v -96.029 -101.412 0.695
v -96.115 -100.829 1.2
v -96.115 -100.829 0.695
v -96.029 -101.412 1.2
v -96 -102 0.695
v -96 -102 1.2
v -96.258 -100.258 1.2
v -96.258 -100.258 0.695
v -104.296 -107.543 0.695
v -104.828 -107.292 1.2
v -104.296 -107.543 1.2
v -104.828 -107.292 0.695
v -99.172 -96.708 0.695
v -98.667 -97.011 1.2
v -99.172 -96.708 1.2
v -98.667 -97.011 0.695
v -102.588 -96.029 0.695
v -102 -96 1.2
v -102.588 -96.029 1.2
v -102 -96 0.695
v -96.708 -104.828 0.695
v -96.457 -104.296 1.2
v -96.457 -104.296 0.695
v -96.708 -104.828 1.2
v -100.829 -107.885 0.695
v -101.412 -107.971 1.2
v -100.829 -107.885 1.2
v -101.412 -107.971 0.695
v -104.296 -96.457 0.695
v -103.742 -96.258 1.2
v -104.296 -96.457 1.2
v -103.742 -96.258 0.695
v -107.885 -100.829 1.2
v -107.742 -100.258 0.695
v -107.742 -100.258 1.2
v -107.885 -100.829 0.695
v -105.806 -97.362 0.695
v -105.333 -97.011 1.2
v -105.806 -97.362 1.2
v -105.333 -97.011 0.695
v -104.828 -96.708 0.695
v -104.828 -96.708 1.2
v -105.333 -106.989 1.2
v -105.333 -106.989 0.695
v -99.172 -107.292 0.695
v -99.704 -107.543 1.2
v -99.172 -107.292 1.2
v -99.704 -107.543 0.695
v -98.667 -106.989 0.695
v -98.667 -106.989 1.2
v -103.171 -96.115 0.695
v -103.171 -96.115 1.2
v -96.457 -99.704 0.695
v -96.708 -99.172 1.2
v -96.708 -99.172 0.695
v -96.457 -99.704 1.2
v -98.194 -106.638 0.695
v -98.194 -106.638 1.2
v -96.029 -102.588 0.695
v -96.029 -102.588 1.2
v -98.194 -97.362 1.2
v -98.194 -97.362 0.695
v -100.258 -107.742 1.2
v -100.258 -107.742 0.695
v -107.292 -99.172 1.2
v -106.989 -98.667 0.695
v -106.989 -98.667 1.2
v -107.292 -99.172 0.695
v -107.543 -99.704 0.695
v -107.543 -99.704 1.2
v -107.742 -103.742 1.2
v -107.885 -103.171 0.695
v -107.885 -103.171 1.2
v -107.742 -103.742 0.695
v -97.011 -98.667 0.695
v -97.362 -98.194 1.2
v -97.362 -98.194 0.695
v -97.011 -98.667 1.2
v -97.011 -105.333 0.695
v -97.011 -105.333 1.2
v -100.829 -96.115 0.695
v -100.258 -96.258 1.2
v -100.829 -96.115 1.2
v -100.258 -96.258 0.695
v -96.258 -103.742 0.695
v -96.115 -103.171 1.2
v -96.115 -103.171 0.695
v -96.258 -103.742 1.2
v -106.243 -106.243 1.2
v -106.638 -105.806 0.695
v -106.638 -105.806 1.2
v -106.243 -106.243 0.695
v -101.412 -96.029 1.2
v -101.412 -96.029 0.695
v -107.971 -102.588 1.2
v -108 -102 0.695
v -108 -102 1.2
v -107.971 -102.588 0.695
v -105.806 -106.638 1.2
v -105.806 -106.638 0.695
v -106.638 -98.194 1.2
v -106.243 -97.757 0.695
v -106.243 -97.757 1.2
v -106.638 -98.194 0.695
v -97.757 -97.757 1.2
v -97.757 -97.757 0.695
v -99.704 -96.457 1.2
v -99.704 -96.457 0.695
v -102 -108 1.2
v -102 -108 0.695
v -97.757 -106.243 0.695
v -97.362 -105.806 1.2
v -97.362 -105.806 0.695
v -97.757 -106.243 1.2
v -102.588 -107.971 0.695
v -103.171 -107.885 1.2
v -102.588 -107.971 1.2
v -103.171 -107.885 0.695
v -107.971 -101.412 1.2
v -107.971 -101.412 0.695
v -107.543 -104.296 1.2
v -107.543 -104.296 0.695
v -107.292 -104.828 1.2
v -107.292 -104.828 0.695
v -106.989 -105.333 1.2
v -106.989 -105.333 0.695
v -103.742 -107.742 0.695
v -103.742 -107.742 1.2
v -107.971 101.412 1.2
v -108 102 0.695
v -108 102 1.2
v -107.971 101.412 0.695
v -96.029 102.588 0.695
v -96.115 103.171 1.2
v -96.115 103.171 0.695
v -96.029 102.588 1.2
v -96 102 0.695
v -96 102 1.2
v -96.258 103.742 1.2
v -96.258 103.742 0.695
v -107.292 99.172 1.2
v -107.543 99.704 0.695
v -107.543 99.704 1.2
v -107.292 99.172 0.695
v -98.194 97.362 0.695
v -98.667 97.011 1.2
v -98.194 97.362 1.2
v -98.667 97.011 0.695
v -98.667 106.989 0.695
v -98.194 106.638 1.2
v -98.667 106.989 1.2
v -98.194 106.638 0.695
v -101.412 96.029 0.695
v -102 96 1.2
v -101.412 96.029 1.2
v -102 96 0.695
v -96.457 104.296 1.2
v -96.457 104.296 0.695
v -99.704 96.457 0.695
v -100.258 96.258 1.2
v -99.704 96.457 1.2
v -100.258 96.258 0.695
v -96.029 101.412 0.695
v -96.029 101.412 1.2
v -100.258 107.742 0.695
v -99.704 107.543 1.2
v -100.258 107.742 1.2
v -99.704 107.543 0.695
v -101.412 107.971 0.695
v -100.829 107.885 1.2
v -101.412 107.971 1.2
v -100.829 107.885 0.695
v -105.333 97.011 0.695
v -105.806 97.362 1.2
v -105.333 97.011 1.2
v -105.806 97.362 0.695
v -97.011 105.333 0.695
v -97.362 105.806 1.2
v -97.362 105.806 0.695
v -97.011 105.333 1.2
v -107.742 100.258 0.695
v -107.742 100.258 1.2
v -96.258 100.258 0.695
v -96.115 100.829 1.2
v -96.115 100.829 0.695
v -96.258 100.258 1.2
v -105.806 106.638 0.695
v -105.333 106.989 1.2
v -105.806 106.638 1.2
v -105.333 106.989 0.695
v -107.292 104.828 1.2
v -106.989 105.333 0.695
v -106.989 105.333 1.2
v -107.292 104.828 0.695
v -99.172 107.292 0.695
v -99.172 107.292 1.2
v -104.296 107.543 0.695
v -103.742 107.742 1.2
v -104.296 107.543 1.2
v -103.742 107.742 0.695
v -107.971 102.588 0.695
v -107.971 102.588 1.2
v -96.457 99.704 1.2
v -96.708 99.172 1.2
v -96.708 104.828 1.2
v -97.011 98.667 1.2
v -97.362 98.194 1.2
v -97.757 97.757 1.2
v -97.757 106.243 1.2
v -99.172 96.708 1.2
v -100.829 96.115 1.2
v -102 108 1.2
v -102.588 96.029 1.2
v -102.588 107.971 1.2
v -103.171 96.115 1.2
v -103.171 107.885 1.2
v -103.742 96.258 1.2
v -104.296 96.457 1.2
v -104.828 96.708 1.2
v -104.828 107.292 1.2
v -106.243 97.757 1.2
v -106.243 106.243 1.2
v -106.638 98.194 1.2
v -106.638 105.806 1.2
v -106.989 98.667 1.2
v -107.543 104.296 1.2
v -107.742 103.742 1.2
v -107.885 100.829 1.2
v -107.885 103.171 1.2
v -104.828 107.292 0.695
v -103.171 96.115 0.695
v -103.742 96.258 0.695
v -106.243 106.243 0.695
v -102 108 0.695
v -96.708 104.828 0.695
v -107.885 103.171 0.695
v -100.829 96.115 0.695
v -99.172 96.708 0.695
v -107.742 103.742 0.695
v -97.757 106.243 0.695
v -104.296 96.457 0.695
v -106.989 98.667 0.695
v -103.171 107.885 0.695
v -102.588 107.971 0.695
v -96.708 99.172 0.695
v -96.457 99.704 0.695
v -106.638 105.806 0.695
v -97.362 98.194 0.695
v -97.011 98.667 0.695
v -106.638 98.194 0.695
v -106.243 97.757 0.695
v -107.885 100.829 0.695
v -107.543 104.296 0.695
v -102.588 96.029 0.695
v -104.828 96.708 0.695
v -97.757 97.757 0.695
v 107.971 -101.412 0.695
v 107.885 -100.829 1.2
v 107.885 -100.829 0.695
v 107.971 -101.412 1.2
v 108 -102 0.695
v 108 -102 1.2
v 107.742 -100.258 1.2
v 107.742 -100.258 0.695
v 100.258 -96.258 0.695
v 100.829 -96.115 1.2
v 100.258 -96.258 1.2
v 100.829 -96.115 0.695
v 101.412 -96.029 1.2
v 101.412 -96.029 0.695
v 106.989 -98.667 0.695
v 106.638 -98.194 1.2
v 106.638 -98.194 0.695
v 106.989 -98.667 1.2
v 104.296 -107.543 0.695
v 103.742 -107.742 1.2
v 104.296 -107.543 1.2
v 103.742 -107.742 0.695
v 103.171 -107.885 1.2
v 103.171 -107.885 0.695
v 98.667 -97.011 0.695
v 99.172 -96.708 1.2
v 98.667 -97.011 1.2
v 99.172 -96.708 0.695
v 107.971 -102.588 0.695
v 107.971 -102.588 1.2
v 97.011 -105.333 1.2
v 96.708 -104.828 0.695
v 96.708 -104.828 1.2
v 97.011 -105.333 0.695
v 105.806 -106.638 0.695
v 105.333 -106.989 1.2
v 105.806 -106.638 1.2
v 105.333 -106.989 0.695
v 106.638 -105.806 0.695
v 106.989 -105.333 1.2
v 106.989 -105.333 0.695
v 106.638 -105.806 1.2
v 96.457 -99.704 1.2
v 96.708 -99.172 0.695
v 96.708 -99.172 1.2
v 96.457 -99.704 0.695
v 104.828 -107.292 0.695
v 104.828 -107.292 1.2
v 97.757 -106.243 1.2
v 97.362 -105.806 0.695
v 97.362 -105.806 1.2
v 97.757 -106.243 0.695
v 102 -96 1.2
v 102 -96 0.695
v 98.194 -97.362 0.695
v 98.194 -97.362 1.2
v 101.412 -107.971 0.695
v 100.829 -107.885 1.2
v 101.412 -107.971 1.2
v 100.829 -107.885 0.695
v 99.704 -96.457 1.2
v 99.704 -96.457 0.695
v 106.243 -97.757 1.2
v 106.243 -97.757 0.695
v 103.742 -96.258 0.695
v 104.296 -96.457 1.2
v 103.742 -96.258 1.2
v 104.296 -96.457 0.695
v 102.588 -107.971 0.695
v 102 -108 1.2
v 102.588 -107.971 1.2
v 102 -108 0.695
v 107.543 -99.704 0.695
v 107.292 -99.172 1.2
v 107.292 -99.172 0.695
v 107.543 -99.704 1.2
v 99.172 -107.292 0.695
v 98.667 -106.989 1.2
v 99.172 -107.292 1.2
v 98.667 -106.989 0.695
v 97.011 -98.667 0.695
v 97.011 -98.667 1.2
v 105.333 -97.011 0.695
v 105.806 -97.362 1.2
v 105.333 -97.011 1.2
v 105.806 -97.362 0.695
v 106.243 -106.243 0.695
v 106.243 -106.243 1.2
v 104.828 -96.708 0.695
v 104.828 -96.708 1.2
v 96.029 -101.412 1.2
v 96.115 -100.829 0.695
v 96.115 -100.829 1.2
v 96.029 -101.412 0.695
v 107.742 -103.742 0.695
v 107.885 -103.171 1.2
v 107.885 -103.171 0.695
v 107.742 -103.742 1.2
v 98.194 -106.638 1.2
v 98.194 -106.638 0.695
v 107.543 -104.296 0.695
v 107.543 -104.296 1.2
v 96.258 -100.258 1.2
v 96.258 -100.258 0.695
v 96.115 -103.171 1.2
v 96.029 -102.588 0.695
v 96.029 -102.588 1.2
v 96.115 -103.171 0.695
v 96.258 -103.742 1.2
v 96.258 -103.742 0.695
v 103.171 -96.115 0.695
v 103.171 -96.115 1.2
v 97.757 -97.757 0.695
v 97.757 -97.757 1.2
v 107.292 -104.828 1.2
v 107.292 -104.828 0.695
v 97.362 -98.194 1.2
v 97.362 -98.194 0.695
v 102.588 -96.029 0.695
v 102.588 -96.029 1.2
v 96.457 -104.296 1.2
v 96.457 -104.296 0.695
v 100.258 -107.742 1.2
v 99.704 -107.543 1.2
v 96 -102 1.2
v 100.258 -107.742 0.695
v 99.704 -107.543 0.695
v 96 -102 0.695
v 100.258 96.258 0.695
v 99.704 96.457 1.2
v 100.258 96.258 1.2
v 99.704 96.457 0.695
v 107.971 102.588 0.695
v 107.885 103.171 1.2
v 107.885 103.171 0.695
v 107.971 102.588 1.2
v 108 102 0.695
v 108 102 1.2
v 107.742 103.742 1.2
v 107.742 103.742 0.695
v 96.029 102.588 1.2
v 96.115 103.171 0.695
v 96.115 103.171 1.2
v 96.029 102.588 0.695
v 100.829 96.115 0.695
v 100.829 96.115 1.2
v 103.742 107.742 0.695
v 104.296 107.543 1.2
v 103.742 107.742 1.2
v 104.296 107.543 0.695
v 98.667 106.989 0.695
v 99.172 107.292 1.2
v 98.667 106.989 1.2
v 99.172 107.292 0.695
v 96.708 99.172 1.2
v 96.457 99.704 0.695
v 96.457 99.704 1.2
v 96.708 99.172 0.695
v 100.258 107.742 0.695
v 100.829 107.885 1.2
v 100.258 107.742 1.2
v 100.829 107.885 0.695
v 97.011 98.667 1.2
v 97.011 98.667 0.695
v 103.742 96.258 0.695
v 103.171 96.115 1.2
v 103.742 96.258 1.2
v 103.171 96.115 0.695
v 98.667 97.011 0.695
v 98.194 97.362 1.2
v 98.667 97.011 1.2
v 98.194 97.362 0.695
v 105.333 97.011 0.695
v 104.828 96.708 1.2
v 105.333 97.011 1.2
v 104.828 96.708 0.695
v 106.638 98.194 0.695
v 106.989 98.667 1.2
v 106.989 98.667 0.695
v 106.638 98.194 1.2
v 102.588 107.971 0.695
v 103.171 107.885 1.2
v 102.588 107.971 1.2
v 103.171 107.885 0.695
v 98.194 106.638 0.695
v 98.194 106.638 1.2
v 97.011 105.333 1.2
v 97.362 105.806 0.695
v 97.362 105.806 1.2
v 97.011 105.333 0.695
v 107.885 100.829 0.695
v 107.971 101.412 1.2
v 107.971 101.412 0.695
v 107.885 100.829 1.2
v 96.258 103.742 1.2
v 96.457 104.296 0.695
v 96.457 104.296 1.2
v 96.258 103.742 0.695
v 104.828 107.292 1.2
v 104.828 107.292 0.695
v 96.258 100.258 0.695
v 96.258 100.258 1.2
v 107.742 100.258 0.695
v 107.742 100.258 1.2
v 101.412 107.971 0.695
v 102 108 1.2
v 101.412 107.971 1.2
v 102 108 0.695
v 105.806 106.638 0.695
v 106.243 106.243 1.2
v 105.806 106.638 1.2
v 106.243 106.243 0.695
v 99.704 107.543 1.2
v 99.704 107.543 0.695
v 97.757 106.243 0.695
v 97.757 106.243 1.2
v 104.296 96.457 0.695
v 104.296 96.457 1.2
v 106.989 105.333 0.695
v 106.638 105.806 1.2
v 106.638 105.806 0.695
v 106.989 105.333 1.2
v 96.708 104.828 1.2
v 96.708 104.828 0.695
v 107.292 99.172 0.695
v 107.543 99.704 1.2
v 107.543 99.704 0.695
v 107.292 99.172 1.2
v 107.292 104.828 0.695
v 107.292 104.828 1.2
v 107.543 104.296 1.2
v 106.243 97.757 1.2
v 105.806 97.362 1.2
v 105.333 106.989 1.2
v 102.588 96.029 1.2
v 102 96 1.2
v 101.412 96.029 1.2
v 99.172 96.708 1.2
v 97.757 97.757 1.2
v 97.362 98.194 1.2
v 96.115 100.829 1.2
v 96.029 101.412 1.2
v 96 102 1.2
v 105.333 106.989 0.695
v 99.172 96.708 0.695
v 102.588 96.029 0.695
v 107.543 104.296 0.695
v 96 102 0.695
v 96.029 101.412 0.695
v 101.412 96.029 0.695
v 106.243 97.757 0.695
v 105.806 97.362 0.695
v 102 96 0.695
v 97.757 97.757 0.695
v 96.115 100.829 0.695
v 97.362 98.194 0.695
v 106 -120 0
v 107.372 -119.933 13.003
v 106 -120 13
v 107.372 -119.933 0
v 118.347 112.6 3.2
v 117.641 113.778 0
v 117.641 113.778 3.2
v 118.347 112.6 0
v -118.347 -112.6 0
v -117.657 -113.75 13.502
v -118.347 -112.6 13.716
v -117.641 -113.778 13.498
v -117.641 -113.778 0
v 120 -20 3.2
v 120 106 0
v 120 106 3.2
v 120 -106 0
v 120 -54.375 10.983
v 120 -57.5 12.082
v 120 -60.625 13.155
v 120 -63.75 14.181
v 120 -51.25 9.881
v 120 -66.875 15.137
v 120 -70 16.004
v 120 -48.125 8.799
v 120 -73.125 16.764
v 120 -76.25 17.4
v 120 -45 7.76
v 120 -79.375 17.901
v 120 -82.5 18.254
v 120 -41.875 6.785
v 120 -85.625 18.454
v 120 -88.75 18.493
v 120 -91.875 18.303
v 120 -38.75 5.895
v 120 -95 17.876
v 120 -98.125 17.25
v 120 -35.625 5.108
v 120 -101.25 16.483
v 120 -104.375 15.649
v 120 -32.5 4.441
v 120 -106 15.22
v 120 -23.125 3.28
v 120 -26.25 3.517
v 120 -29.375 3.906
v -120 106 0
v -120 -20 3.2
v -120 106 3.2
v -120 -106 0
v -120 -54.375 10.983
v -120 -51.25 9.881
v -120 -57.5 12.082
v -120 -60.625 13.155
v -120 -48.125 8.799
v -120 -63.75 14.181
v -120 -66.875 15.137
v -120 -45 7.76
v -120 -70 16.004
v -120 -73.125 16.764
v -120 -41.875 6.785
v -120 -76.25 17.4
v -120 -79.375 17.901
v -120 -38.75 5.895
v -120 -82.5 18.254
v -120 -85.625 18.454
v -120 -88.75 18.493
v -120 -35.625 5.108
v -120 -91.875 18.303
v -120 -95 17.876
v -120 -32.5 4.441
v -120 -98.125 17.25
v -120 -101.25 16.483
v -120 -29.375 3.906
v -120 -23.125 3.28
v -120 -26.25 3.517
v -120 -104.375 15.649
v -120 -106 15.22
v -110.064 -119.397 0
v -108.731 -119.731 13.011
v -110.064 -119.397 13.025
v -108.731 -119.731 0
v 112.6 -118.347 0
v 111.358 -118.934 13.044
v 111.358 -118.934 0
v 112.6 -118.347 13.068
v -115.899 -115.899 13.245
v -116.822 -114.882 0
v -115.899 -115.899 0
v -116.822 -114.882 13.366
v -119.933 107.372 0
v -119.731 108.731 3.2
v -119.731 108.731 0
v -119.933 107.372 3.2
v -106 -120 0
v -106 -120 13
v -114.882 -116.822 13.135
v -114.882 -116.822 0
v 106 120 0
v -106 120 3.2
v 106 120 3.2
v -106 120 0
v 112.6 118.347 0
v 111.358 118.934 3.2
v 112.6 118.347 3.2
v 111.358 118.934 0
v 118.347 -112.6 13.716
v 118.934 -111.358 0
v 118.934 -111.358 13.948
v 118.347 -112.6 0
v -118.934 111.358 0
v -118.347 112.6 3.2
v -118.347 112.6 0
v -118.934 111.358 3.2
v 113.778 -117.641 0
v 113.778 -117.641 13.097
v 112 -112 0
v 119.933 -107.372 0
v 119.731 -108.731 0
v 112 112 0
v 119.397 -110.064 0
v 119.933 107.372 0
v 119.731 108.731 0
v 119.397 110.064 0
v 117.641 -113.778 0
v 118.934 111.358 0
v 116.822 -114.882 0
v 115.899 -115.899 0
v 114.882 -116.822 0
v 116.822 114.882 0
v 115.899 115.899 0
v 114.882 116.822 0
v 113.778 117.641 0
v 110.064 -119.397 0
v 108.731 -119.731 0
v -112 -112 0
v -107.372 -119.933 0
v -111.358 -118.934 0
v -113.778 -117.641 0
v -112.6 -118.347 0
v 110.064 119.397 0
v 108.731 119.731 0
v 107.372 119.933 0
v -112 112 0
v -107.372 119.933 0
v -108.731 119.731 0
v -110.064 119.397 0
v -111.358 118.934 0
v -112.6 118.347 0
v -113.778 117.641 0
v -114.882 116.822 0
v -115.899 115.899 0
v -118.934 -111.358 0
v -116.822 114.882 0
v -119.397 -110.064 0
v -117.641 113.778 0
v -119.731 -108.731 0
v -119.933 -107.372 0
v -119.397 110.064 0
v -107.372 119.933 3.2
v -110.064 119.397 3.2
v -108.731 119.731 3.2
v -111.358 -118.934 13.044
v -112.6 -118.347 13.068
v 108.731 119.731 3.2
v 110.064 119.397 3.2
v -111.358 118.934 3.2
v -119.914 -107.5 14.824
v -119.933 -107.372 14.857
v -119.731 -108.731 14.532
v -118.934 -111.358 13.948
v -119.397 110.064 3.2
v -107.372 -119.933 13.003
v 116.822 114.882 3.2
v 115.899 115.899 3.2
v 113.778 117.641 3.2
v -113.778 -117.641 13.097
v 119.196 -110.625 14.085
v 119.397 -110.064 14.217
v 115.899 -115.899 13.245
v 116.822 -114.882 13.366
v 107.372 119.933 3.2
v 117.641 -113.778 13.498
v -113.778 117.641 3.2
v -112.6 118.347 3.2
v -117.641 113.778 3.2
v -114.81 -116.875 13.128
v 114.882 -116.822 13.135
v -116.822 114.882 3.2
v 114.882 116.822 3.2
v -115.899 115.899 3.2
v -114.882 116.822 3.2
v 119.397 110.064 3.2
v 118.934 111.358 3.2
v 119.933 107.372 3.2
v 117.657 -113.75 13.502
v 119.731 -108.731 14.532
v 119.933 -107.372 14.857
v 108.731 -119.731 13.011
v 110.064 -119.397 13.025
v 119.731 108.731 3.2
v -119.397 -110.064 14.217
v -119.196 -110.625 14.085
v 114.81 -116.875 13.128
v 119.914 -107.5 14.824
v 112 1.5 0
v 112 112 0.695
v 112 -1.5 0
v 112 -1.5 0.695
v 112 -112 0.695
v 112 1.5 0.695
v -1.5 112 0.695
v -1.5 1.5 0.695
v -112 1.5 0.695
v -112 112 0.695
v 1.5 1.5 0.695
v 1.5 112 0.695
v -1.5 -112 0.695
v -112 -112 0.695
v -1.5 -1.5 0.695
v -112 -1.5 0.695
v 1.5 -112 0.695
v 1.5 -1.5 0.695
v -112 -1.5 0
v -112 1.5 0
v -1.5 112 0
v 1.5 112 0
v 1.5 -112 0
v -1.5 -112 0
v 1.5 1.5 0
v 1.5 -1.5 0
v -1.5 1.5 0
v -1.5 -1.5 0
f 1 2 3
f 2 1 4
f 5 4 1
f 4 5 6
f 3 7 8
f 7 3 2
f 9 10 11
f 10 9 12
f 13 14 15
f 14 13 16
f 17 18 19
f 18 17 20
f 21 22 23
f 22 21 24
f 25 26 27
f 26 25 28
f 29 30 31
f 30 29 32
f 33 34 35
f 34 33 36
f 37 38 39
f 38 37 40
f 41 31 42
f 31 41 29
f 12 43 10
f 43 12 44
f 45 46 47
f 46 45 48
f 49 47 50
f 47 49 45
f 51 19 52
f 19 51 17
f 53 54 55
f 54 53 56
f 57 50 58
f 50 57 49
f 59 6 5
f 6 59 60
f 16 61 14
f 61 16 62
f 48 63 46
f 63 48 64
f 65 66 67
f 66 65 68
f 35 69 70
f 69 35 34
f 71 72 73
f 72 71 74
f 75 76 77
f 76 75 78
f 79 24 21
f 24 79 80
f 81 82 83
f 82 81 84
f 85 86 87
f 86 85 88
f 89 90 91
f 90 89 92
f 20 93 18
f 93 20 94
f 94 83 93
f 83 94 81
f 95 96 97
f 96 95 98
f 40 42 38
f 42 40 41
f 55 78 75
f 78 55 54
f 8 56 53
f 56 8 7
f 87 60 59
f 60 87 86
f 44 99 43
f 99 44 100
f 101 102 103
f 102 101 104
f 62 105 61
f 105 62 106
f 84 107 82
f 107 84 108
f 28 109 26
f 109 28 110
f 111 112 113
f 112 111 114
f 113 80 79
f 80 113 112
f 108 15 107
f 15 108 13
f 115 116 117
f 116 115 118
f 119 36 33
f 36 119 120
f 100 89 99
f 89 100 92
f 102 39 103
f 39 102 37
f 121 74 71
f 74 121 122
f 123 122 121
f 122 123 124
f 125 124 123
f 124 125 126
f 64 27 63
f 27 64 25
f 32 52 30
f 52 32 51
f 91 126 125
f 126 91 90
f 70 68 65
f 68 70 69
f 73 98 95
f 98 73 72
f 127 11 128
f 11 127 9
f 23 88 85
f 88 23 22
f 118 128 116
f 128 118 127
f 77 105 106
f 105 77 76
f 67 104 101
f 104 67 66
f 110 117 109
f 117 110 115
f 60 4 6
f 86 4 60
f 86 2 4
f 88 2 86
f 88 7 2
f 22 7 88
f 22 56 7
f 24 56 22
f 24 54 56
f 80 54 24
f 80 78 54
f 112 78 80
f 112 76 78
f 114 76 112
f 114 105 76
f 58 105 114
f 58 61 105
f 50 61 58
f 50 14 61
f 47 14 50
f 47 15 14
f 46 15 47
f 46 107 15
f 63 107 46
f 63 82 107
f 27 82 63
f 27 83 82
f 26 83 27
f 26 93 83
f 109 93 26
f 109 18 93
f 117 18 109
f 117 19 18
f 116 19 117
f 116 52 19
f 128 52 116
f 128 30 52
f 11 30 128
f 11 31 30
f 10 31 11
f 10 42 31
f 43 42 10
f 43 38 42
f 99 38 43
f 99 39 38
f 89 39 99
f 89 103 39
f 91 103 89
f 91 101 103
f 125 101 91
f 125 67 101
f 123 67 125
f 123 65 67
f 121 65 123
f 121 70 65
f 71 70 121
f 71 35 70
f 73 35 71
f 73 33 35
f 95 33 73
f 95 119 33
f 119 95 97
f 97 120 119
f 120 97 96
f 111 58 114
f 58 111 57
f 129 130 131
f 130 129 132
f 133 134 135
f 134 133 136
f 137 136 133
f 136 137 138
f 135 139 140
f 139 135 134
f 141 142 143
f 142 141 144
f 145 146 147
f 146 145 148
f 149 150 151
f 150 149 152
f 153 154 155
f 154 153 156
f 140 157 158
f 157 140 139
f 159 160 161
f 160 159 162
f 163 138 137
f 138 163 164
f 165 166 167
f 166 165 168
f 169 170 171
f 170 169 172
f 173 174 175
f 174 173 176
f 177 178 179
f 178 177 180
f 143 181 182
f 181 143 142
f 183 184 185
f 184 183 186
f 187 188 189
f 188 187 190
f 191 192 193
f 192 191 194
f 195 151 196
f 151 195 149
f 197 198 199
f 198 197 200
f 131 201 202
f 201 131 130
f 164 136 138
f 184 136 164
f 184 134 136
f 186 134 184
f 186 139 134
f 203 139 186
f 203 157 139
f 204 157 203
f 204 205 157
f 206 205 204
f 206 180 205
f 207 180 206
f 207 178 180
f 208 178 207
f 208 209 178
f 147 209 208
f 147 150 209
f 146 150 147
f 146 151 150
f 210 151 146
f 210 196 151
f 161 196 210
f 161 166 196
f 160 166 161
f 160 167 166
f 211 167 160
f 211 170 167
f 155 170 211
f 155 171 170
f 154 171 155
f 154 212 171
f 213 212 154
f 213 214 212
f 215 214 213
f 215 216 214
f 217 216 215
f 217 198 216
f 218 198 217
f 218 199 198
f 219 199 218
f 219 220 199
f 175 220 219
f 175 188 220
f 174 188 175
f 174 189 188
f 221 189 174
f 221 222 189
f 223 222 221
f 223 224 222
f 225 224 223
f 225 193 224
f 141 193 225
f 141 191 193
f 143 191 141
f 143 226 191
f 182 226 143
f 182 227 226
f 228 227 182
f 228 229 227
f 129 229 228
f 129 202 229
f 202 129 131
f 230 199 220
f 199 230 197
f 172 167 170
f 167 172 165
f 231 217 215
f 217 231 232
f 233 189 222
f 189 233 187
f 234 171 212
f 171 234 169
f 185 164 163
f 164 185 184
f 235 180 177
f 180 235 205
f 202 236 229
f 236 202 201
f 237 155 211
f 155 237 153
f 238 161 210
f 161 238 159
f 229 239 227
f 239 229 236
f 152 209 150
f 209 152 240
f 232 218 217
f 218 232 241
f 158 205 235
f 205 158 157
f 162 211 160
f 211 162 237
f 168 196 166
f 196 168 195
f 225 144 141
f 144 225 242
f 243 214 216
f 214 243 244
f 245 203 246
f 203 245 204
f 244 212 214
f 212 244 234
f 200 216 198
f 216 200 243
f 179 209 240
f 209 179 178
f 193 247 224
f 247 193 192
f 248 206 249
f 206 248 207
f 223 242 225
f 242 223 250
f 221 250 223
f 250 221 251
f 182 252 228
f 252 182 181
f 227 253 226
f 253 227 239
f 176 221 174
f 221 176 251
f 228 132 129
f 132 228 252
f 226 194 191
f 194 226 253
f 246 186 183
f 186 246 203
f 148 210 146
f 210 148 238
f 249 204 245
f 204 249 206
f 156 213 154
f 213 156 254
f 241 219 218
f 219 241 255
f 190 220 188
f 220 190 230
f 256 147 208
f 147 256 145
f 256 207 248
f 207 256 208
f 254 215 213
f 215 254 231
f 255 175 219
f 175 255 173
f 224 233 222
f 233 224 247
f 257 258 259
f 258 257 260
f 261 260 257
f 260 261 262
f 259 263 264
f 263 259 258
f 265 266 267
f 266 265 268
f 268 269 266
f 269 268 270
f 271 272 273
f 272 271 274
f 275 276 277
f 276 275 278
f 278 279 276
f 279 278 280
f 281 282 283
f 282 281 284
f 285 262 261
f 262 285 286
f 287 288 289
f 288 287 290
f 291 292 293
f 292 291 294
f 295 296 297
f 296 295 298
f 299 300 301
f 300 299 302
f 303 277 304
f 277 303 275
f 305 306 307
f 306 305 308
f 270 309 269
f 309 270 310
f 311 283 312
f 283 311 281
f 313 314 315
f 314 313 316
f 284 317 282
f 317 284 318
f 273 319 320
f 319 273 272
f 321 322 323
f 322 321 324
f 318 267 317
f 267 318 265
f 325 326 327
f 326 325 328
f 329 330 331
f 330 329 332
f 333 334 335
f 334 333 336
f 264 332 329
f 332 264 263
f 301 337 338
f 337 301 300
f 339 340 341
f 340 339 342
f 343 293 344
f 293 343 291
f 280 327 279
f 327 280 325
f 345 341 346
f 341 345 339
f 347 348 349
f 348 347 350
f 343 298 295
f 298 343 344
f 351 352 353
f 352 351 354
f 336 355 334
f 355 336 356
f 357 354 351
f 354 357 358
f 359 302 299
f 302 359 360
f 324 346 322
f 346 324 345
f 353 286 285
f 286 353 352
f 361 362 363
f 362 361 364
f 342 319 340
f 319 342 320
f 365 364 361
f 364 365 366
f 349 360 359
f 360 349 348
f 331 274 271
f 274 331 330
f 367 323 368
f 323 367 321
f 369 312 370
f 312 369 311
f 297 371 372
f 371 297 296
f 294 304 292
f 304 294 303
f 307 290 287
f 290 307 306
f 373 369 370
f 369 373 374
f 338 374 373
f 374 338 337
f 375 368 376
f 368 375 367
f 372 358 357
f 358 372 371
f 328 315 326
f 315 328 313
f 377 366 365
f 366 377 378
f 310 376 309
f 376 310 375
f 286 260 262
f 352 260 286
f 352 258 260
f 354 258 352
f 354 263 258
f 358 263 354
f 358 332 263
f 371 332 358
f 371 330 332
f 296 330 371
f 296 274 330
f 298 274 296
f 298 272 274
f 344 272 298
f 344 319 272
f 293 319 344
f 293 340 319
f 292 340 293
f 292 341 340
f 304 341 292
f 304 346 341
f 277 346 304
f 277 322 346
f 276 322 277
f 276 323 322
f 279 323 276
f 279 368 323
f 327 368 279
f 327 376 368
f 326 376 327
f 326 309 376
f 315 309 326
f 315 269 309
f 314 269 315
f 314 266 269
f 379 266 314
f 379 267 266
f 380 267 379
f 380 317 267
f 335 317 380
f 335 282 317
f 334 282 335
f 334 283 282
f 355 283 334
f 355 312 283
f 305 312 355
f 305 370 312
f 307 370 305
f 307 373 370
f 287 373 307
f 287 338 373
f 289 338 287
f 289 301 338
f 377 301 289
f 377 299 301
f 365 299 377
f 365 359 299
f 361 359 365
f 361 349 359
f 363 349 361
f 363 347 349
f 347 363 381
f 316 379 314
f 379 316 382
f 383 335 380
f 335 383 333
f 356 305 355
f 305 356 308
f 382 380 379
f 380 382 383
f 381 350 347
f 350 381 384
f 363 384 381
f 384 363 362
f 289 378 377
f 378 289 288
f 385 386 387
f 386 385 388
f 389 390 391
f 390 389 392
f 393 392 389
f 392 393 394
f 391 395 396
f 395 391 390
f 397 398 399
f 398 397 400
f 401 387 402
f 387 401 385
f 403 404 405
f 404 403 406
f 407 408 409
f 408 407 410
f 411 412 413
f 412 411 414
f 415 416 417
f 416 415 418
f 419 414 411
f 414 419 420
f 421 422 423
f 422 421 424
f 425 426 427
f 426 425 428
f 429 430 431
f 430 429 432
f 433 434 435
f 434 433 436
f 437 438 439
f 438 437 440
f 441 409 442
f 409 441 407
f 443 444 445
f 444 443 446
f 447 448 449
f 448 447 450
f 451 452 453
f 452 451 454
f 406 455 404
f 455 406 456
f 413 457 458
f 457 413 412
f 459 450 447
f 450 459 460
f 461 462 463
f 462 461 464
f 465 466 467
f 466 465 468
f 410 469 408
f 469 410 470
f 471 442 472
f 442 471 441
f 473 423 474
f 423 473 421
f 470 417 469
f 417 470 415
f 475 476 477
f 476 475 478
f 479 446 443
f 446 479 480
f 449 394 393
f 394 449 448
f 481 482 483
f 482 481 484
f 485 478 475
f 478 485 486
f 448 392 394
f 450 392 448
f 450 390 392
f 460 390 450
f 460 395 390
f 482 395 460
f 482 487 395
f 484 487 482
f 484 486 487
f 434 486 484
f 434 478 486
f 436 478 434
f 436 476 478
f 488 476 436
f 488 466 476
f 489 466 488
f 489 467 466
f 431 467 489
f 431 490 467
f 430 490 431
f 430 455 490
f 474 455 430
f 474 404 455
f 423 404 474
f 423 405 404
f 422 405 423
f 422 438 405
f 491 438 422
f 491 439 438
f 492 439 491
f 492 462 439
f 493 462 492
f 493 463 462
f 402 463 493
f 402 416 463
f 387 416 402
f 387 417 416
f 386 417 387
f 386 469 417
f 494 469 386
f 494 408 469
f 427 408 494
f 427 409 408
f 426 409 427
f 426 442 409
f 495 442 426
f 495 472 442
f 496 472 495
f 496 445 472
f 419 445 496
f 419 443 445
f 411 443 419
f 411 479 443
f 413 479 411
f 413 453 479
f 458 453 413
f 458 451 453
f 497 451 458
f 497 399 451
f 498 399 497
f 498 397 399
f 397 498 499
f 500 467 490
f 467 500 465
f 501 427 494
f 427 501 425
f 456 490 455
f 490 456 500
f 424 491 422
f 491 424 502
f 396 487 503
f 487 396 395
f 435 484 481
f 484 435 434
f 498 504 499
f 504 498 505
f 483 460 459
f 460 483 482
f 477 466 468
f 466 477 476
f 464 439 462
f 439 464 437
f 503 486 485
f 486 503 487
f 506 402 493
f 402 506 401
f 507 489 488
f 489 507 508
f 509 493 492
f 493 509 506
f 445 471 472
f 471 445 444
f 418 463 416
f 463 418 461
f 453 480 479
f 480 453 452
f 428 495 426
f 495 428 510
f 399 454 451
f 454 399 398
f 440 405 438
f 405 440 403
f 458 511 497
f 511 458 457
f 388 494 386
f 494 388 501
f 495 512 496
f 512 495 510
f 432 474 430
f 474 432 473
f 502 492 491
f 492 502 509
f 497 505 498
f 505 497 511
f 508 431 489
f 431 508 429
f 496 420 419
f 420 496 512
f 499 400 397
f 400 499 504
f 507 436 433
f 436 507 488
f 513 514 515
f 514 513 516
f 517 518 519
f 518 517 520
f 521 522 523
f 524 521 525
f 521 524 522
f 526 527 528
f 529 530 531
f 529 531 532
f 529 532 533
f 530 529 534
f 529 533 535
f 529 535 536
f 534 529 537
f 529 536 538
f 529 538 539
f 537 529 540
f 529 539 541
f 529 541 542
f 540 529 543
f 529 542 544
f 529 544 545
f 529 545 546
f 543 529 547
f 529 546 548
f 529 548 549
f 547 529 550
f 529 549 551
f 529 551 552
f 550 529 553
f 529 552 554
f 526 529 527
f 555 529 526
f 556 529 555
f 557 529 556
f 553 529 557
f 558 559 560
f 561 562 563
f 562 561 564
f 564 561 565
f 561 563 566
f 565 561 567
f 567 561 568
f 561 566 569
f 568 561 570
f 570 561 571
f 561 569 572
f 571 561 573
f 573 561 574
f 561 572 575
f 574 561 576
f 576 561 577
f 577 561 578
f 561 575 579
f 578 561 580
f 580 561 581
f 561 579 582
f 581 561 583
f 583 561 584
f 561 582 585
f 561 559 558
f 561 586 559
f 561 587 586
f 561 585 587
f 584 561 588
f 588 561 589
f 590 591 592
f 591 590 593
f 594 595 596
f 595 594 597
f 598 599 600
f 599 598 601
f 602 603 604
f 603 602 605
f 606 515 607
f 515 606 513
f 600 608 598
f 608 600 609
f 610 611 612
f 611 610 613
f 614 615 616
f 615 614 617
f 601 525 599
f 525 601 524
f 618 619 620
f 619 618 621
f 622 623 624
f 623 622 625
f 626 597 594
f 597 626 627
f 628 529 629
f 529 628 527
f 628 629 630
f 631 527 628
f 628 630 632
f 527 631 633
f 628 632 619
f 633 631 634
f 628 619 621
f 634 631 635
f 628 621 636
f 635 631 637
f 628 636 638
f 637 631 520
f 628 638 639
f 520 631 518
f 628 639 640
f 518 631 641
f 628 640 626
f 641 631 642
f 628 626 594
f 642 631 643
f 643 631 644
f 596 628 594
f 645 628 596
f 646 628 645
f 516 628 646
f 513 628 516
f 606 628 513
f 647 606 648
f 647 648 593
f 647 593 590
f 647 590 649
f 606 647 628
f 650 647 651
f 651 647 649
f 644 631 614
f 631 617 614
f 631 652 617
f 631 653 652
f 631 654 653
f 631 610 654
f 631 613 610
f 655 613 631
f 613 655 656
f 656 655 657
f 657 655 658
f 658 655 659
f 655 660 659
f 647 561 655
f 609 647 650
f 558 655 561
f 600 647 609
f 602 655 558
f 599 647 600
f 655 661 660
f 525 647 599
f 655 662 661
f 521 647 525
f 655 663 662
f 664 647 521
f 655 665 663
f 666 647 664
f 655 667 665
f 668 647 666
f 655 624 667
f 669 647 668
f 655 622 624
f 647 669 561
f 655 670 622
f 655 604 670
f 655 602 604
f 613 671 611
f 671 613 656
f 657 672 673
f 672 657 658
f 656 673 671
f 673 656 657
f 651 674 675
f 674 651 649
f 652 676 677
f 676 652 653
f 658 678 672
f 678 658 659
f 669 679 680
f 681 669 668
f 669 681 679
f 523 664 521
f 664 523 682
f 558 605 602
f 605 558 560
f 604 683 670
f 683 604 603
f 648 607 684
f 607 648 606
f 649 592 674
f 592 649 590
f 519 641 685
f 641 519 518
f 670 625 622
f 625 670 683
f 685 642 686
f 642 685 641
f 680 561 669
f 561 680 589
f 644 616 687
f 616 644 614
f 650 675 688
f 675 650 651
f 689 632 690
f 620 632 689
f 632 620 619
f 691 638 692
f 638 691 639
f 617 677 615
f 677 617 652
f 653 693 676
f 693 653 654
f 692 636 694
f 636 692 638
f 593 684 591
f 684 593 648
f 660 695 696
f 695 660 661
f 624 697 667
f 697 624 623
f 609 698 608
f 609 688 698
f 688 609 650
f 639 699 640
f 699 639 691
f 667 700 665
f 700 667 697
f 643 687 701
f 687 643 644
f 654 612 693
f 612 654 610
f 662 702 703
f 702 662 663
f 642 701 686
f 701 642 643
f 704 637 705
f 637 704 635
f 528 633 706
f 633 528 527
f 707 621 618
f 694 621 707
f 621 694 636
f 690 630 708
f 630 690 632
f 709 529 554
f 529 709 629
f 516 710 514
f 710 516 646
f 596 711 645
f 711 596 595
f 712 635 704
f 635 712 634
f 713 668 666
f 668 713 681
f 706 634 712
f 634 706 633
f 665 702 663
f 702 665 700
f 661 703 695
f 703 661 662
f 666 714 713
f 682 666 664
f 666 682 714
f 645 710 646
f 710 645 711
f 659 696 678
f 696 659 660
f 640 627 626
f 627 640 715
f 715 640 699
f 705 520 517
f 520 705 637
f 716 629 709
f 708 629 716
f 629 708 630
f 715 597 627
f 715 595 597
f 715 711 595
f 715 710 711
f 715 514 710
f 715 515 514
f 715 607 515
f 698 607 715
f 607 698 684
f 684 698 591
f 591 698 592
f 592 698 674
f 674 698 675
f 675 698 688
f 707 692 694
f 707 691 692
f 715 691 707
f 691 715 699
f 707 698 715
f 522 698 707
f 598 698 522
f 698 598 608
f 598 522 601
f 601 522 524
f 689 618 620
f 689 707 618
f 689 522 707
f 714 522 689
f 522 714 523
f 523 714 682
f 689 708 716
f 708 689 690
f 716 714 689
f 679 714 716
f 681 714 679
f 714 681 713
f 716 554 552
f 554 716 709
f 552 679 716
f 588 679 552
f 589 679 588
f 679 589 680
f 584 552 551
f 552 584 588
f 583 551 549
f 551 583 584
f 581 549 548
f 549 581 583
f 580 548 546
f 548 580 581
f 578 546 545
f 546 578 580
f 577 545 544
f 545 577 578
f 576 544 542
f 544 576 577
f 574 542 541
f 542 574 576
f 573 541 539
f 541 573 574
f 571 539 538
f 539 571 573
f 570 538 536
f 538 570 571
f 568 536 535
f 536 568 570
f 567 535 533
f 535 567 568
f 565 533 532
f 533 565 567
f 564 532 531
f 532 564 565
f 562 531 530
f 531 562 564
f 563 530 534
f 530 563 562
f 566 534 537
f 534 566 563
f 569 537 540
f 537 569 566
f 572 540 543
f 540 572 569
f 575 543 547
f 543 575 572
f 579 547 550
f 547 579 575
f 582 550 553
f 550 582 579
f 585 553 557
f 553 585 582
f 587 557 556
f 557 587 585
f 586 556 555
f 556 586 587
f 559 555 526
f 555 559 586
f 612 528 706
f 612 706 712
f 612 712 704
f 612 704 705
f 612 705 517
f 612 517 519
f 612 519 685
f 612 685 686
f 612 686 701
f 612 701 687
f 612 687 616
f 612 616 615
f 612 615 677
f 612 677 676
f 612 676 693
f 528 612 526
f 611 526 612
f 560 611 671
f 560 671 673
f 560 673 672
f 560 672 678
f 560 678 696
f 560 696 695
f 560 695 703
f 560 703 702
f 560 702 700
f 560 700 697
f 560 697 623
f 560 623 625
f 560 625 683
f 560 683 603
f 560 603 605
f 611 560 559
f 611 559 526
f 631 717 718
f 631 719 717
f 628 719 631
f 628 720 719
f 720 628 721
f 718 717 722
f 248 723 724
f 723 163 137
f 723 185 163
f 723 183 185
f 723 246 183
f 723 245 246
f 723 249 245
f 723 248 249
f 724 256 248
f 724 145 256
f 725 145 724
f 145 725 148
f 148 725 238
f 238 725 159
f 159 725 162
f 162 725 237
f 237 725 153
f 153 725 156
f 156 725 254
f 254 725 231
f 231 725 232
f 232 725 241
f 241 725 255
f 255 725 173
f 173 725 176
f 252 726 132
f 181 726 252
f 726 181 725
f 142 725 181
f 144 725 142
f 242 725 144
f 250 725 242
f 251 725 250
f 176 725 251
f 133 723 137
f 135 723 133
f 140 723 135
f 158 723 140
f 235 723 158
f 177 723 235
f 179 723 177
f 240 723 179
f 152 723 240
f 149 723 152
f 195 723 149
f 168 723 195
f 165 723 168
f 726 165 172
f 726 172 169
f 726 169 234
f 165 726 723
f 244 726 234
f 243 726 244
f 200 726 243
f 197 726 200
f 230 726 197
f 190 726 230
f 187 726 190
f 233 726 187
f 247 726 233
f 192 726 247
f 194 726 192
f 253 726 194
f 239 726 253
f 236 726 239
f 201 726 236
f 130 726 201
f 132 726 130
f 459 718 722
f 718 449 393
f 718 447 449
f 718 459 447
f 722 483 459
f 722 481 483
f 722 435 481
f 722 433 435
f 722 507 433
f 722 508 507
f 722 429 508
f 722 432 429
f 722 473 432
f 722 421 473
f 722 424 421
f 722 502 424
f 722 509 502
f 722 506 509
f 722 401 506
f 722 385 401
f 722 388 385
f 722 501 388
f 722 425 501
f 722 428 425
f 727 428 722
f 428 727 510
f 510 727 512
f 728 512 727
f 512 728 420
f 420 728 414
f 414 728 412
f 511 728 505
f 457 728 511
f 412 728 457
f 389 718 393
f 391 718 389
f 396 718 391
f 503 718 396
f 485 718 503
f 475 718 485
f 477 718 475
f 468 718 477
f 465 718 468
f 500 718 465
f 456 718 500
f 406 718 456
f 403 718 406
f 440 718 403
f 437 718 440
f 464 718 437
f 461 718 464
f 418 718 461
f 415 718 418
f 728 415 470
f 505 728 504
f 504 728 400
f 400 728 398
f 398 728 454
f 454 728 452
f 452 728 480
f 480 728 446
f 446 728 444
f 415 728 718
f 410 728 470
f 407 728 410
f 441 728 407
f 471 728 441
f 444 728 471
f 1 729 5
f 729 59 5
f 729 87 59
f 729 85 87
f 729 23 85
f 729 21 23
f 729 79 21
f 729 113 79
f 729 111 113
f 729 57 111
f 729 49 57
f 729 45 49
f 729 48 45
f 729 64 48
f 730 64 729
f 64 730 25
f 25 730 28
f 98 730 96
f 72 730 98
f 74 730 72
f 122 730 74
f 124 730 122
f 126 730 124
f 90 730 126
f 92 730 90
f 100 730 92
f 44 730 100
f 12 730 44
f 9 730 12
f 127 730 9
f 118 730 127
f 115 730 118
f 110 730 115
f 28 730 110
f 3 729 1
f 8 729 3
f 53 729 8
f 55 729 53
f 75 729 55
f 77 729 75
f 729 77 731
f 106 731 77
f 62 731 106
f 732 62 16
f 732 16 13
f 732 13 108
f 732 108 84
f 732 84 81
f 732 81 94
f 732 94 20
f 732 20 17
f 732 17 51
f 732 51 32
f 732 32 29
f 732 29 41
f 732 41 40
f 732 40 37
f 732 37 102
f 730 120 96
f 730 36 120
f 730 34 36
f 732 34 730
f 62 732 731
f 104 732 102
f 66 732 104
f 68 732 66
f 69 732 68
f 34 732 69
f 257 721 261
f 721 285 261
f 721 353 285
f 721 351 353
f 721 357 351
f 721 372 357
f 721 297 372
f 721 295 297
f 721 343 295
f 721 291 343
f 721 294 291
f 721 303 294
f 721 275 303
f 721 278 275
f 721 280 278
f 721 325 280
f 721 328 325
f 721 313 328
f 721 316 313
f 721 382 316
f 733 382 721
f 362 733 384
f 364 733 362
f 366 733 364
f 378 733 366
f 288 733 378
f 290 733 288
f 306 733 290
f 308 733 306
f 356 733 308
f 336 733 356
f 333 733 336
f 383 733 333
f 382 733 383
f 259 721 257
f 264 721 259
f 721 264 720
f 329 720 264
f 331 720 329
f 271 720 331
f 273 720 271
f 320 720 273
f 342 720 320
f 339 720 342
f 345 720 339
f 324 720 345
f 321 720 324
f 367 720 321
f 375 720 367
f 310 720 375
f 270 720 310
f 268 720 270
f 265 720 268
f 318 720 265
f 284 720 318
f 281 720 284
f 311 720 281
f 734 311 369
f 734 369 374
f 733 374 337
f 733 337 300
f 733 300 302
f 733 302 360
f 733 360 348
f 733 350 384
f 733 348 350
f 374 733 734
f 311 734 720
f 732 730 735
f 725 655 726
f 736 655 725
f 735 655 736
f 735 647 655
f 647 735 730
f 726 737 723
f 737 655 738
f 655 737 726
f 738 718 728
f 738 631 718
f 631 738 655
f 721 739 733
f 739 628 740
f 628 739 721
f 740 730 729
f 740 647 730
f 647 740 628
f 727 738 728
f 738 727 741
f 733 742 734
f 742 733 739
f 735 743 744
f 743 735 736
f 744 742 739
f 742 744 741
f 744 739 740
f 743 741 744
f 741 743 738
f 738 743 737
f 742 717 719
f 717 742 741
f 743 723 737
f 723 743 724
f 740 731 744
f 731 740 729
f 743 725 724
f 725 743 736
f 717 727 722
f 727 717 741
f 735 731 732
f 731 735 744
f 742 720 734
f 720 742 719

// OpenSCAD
// Parametric integrated wrist-rest mousepad for 250×250 mm FDM trays.
// Companion to the build123d source (text-to-cad style parametric workflow).
// Units: mm. Print flat on the bed (Z up).

/* [Fit] */
width = 240;
depth = 240;
corner_r = 14;
pad_thickness = 3.2;

/* [Wrist rest] */
wrist_front_h = 13;
wrist_peak_h = 18.5;
wrist_peak_from_front = 32;
wrist_end = 100; // peak blend meets pad

/* [Feet / underside] */
foot_d = 12;
foot_depth = 1.2;
foot_inset = 18;
underside_inset = 8;
underside_depth = 1.4;
rib_w = 3;

$fn = 64;

module footprint_2d() {
  offset(r = corner_r)
    square([width - 2 * corner_r, depth - 2 * corner_r], center = true);
}

function wrist_h(y_from_front) =
  y_from_front <= 0 ? wrist_front_h :
  y_from_front >= wrist_end ? pad_thickness :
  y_from_front <= wrist_peak_from_front
    ? let (t = y_from_front / wrist_peak_from_front,
           w = 0.5 - 0.5 * cos(180 * t))
        wrist_front_h + (wrist_peak_h - wrist_front_h) * w
    : let (t = (y_from_front - wrist_peak_from_front) / (wrist_end - wrist_peak_from_front),
           w = 0.5 - 0.5 * cos(180 * t))
        wrist_peak_h + (pad_thickness - wrist_peak_h) * w;

module mousepad() {
  front = -depth / 2;
  samples = 32;
  difference() {
    // blank
    linear_extrude(height = wrist_peak_h)
      footprint_2d();

    // cut above height profile (YZ cutter extruded in X)
    translate([0, 0, 0])
      rotate([90, 0, 90])
        linear_extrude(height = width + 20, center = true)
          polygon(concat(
            [[front - 2, wrist_peak_h + 5], [front - 2, wrist_front_h]],
            [for (i = [0:samples])
              let (y = front + (wrist_end / samples) * i,
                   h = wrist_h(y - front))
              [y, h]
            ],
            [[depth / 2, pad_thickness],
             [depth / 2 + 2, pad_thickness],
             [depth / 2 + 2, wrist_peak_h + 5]]
          ));

    // foot pockets
    for (sx = [-1, 1], sy = [-1, 1])
      translate([sx * (width / 2 - foot_inset), sy * (depth / 2 - foot_inset), -0.01])
        cylinder(d = foot_d, h = foot_depth + 0.01);

    // underside pocket
    translate([0, 0, -0.01])
      cube([width - 2 * underside_inset, depth - 2 * underside_inset, underside_depth + 0.01], center = true);
  }

  // restore cross ribs in underside pocket volume
  translate([0, 0, underside_depth / 2]) {
    cube([rib_w, depth - 2 * underside_inset, underside_depth], center = true);
    cube([width - 2 * underside_inset, rib_w, underside_depth], center = true);
  }
}

mousepad();
